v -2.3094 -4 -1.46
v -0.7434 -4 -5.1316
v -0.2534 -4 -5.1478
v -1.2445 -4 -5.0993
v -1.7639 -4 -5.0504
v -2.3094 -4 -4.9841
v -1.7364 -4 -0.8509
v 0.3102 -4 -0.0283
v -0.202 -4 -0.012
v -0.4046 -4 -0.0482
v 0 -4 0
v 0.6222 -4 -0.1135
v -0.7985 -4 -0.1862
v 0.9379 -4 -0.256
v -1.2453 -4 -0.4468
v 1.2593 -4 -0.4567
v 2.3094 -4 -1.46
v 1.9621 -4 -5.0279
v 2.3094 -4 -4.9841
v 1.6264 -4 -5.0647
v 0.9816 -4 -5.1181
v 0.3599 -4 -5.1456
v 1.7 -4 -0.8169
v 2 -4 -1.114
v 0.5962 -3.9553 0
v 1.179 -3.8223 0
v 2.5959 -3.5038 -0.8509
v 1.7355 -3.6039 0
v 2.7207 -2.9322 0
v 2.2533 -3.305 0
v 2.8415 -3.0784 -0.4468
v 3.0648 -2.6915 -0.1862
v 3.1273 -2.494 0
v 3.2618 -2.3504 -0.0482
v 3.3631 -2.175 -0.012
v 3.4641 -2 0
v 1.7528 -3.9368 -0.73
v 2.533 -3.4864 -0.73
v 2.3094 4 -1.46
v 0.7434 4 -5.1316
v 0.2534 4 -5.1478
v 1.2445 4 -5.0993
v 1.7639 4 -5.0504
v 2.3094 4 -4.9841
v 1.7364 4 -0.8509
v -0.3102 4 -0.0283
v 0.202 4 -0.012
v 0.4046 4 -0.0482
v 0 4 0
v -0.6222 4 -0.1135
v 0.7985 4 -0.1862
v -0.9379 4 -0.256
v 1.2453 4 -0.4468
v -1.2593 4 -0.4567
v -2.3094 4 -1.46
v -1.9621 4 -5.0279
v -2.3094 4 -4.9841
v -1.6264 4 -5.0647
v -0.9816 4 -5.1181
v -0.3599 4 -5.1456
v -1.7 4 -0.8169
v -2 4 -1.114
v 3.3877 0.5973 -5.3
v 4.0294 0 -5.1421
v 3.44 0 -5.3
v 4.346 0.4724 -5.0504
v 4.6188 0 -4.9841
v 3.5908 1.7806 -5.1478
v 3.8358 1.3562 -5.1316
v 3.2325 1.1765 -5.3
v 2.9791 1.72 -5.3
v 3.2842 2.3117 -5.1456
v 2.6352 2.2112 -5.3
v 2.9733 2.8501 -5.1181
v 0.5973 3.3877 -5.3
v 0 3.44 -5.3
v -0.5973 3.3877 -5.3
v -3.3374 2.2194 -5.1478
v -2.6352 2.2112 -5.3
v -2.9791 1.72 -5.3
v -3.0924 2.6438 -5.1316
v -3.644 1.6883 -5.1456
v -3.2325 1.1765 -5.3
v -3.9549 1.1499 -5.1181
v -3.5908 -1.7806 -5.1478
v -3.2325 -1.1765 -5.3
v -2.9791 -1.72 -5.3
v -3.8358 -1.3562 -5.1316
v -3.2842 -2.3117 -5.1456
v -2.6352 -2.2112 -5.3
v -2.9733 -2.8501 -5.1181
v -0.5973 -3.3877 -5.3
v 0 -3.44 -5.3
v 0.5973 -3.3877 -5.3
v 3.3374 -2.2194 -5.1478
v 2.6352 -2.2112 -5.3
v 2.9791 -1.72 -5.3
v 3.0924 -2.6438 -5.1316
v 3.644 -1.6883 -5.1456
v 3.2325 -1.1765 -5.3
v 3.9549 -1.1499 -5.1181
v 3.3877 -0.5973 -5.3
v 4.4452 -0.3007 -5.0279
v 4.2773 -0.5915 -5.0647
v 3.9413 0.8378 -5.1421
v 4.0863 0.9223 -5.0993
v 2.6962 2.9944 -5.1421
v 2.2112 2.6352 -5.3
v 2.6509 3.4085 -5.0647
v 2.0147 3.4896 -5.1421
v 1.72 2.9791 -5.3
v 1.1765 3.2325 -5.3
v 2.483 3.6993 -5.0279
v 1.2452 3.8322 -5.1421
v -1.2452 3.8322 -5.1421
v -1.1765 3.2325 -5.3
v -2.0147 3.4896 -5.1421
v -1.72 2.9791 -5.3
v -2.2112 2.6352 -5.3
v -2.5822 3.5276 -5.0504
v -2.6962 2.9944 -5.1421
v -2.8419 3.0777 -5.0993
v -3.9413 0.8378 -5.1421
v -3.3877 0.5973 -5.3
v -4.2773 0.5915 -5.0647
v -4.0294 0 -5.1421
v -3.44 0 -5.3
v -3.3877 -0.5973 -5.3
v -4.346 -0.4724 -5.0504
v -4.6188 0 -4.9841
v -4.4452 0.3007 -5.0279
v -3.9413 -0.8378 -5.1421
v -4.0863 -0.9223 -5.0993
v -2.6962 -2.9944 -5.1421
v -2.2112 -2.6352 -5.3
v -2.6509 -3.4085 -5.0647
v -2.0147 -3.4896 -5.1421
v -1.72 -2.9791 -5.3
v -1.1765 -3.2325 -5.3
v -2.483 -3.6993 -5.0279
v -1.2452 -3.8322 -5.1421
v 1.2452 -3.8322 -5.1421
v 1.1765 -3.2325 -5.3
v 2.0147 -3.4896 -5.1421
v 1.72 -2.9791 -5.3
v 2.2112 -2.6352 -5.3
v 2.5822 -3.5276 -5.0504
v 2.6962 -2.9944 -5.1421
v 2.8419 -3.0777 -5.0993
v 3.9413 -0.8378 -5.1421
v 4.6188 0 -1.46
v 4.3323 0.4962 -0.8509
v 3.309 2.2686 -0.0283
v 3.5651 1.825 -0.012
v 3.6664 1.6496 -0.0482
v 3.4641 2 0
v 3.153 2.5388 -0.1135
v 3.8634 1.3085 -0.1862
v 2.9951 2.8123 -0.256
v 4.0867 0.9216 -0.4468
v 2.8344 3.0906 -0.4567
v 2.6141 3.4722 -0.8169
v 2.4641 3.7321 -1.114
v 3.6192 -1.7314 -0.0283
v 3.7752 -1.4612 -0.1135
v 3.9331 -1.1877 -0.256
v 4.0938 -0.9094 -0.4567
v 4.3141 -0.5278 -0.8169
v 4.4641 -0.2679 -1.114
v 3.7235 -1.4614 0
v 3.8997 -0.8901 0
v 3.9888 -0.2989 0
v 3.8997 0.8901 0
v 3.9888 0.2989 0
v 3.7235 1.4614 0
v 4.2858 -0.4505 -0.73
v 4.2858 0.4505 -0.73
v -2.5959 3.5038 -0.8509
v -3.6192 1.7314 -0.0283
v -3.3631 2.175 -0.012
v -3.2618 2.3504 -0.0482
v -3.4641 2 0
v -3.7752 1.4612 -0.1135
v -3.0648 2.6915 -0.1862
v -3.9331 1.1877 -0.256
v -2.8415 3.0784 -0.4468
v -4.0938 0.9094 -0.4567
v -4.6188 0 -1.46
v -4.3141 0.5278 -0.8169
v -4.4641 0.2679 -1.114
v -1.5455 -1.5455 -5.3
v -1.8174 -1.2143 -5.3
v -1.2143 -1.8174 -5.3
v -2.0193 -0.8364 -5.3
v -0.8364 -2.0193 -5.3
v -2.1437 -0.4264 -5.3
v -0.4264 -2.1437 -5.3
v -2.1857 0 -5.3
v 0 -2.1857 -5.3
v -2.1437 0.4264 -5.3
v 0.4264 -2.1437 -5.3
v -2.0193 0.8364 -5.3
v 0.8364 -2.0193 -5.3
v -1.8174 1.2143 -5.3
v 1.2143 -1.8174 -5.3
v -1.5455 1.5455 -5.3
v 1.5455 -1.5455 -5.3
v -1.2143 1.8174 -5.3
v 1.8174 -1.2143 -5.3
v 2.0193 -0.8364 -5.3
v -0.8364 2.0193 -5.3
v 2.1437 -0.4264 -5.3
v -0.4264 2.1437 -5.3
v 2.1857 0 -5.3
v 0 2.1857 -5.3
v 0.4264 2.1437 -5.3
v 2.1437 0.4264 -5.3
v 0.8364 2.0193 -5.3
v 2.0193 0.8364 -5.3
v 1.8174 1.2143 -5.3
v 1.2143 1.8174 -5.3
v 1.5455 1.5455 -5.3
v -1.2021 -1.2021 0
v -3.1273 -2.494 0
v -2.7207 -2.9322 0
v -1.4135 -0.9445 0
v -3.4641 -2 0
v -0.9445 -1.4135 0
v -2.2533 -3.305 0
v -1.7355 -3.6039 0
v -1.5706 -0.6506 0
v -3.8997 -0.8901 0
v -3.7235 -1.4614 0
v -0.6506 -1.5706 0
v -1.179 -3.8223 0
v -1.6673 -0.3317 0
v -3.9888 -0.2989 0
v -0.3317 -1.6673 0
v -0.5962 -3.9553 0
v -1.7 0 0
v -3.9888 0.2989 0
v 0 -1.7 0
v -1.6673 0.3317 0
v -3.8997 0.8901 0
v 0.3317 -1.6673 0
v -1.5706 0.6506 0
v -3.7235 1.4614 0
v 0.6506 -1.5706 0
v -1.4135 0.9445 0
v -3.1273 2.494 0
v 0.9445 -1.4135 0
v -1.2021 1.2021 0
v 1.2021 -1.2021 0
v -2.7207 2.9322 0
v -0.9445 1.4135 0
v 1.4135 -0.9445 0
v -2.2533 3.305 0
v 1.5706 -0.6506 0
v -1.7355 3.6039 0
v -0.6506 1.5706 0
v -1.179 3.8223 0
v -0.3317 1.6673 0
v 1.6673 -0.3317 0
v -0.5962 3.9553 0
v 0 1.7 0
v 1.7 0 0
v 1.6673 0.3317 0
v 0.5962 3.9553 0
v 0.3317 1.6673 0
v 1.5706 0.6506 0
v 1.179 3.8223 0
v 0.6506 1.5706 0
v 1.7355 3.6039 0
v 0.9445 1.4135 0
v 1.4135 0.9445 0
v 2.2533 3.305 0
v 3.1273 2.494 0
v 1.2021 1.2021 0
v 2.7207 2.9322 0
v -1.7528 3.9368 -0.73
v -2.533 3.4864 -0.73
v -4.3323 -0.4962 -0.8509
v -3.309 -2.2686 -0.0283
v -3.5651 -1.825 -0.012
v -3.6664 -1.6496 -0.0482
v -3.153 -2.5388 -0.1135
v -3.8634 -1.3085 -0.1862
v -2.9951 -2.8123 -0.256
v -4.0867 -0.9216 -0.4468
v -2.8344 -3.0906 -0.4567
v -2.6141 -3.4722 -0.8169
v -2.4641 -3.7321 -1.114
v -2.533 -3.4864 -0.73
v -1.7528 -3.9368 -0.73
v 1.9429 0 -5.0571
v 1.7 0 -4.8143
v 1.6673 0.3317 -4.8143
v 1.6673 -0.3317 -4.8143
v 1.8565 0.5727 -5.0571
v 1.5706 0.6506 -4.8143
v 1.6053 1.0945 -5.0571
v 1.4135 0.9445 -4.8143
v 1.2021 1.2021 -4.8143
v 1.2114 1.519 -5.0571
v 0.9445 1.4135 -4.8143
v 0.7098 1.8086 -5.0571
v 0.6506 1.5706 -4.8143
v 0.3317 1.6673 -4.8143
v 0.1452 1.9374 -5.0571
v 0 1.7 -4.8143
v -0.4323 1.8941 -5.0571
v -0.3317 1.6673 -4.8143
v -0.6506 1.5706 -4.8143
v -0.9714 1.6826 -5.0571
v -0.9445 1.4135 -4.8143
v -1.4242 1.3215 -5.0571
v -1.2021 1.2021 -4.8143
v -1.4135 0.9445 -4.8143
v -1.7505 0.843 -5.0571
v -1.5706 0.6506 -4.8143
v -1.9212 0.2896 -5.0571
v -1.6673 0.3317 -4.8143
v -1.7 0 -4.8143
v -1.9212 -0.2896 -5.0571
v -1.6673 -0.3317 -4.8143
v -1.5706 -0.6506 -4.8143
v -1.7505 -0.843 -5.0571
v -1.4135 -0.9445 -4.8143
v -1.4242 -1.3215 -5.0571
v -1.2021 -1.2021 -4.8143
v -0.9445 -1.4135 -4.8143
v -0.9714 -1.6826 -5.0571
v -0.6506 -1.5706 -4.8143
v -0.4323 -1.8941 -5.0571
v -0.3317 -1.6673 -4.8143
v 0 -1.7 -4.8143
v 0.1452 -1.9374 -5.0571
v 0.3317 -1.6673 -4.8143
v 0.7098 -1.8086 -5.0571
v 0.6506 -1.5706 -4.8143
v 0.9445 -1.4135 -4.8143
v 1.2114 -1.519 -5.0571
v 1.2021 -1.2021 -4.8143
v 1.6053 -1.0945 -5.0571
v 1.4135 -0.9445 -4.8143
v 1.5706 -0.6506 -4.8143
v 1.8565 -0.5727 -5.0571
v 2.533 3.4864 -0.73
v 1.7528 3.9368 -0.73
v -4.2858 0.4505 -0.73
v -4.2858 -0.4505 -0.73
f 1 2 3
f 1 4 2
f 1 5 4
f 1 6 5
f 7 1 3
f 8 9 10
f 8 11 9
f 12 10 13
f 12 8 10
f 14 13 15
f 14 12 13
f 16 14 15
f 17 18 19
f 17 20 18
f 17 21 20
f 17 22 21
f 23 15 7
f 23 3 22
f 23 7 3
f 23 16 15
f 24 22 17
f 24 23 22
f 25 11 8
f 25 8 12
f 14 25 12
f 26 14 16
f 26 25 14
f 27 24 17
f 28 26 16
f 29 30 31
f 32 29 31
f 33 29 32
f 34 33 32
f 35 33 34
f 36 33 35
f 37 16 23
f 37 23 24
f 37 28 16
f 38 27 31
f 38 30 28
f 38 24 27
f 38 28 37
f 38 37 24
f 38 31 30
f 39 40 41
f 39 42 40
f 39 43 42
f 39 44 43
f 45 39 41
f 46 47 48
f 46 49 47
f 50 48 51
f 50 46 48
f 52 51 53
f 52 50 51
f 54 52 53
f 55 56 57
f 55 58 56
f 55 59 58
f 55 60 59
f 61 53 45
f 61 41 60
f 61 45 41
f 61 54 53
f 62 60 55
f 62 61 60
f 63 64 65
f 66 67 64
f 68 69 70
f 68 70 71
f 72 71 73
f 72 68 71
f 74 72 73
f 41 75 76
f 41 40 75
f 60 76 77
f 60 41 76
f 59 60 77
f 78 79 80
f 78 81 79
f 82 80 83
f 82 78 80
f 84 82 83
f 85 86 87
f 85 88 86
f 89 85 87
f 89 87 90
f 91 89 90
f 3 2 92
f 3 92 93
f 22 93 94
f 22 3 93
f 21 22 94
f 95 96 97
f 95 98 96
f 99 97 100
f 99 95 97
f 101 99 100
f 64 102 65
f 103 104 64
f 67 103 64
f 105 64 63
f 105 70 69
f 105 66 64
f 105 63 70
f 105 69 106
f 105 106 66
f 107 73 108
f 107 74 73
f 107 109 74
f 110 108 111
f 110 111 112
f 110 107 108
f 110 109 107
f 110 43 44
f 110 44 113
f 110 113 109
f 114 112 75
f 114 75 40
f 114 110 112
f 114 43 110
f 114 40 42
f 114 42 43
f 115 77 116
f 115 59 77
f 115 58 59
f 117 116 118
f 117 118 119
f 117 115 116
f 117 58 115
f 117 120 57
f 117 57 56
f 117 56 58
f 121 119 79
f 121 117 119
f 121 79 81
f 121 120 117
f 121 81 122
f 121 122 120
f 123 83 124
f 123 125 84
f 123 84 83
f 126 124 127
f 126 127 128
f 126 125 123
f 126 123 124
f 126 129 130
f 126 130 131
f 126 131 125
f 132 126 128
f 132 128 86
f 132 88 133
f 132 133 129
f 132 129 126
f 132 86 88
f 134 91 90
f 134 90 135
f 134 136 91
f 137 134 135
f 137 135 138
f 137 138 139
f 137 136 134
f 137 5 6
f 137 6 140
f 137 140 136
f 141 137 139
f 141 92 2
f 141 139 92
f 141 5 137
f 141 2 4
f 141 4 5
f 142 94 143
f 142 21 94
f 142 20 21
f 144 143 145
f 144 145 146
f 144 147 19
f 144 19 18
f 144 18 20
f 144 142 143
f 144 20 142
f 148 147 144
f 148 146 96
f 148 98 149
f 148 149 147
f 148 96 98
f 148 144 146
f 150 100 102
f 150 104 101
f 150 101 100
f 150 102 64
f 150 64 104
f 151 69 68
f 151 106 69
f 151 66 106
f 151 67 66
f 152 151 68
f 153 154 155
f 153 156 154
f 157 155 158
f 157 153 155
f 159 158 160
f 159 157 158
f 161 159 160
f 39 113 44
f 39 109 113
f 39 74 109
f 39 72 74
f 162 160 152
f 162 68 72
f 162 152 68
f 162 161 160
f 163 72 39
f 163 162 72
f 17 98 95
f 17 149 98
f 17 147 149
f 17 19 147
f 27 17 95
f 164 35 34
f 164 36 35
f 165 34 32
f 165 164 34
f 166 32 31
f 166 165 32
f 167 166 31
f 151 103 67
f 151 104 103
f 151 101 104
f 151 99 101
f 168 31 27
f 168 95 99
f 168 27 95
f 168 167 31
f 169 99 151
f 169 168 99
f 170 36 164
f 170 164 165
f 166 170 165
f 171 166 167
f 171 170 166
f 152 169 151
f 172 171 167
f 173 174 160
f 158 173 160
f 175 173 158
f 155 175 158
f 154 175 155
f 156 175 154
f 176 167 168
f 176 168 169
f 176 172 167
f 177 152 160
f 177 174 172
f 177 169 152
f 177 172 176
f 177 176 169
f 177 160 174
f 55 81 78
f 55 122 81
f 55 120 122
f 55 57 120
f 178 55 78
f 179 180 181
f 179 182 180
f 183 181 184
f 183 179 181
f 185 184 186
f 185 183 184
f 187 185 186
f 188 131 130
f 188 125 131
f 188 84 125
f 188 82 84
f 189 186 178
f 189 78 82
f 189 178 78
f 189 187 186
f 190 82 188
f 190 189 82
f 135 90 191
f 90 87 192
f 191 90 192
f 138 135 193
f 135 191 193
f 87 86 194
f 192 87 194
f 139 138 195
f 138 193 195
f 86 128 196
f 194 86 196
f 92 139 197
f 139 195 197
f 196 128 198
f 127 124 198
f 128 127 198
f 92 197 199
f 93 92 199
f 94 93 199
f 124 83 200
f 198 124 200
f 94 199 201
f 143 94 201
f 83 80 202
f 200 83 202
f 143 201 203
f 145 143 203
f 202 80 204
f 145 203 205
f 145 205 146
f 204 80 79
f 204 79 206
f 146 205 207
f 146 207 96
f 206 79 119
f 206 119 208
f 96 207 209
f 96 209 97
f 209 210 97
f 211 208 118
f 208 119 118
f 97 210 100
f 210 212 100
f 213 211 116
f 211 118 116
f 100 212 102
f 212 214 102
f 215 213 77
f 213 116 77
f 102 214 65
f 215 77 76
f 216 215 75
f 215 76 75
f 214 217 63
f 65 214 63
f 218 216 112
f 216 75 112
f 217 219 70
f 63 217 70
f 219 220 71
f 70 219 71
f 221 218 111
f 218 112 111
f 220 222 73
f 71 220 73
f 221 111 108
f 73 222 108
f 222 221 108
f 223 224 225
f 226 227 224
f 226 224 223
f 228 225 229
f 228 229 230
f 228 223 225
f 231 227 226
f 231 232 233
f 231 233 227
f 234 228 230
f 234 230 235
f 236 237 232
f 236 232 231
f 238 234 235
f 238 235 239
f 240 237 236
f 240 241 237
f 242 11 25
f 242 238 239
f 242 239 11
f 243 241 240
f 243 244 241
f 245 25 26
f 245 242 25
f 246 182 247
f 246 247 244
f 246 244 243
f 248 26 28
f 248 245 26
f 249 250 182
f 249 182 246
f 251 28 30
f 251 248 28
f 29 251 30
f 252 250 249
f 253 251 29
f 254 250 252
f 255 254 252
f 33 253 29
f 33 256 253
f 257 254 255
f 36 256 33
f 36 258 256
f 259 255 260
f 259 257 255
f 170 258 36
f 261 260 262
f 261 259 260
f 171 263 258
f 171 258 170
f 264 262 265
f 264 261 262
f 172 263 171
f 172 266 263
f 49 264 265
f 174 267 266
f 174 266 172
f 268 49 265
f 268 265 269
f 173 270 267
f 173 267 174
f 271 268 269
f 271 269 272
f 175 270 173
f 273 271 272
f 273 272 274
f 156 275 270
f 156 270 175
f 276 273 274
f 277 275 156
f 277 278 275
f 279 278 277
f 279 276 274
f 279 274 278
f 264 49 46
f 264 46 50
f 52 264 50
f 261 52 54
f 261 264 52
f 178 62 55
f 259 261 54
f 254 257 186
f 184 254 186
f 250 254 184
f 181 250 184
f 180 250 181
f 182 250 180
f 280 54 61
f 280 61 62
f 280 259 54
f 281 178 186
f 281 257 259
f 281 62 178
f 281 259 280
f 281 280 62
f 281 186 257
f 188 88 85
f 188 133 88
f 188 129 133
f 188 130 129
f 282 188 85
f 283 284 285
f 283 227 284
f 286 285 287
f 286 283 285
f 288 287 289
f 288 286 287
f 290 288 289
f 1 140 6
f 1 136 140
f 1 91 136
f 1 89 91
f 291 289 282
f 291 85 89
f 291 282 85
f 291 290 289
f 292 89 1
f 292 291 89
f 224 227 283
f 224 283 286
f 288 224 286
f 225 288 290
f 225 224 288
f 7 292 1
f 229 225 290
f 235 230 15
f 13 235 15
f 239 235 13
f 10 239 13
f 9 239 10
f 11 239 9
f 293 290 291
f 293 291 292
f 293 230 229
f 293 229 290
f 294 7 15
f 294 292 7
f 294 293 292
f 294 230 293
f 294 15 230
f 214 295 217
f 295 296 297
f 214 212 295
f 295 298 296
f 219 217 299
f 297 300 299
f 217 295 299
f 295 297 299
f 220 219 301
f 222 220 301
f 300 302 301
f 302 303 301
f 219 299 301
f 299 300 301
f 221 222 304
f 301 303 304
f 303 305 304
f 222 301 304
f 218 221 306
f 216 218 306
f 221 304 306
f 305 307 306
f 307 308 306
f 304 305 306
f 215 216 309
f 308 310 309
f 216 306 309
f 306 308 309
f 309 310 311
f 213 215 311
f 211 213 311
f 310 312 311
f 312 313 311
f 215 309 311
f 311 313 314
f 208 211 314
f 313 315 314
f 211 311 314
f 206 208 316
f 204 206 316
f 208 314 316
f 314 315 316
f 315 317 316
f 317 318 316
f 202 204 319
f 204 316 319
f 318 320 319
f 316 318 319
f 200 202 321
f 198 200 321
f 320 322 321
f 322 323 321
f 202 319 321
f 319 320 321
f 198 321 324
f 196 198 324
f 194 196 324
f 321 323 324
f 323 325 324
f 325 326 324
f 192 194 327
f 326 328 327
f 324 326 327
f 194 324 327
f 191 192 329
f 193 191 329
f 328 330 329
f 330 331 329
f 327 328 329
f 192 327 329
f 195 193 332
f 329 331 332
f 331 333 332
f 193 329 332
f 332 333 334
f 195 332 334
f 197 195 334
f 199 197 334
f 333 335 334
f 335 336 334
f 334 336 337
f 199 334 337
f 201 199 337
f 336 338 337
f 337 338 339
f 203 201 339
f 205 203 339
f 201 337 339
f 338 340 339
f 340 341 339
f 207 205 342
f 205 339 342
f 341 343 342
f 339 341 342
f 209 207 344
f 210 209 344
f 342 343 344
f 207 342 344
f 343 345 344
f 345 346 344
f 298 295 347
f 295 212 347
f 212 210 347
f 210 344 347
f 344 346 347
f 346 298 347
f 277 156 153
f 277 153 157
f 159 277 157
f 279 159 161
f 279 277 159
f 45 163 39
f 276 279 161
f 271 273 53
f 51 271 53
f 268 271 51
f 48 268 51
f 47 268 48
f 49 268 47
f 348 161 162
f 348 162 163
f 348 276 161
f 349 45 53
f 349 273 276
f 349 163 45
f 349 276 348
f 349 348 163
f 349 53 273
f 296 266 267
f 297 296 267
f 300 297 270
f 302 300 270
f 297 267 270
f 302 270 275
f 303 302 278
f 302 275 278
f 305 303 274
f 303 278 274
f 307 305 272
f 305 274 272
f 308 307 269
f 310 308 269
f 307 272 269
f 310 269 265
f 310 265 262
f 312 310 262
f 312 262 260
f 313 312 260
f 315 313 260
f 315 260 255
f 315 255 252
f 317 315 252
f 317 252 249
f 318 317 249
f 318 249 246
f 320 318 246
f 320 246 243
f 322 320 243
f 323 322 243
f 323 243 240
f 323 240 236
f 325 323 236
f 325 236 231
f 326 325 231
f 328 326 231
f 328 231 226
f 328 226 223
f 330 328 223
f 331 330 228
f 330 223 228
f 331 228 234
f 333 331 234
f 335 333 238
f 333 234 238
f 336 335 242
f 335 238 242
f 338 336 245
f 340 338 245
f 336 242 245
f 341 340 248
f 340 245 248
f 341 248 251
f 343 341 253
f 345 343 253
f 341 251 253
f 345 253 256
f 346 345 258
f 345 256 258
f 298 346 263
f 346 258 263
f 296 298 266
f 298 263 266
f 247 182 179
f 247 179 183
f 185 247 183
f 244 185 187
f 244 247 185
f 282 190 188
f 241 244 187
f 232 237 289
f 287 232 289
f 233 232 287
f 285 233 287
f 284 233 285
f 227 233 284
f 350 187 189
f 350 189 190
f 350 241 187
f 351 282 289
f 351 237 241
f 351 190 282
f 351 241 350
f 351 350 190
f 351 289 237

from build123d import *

# Parameters (mm, degrees)
BASENUT_DEPTH   = 5.3
SKETCH3_R       = 1.7
HOLE_DEPTH      = 6.3
ENDCHAMFER_SIZE = 0.485714286


with BuildPart() as part:
    # Sketch1 → BaseNut (new body)
    with BuildSketch(Plane.XY):
        Polygon((2.309401077, -4), (4.618802154, 0), (2.309401077, 4), (-2.309401077, 4), (-4.618802154, 0), (-2.309401077, -4), align=None)
    extrude(amount=-BASENUT_DEPTH)

    # Sketch2 → Double-Chamfer (revolve, cut)
    with BuildSketch(Plane(origin=(0.481162538, 0, -5.099964691), x_dir=(0, 0, -1), z_dir=(0, -1, 0))):
        Polygon((-0.115823776, 4.137639616), (0.200035309, 4.137639616), (0.200035309, 2.958837462), align=None)
        Polygon((-5.099964691, 4.137639616), (-3.639964691, 4.137639616), (-5.099964691, 3.518837462), align=None)
    revolve(axis=Axis((0, 0, -4.462865094), (0, 0, 1)), mode=Mode.SUBTRACT)

    # Sketch3 → Hole (cut, through all)
    with BuildSketch(Plane.XY):
        Circle(SKETCH3_R)
    extrude(amount=-HOLE_DEPTH, mode=Mode.SUBTRACT)

    # EndChamfer
    endchamfer_edges = [part.edges().sort_by_distance(p)[0] for p in [
        (-1.7, 0, -5.3),
    ]]
    chamfer(endchamfer_edges, length=ENDCHAMFER_SIZE)


solid = part.part
